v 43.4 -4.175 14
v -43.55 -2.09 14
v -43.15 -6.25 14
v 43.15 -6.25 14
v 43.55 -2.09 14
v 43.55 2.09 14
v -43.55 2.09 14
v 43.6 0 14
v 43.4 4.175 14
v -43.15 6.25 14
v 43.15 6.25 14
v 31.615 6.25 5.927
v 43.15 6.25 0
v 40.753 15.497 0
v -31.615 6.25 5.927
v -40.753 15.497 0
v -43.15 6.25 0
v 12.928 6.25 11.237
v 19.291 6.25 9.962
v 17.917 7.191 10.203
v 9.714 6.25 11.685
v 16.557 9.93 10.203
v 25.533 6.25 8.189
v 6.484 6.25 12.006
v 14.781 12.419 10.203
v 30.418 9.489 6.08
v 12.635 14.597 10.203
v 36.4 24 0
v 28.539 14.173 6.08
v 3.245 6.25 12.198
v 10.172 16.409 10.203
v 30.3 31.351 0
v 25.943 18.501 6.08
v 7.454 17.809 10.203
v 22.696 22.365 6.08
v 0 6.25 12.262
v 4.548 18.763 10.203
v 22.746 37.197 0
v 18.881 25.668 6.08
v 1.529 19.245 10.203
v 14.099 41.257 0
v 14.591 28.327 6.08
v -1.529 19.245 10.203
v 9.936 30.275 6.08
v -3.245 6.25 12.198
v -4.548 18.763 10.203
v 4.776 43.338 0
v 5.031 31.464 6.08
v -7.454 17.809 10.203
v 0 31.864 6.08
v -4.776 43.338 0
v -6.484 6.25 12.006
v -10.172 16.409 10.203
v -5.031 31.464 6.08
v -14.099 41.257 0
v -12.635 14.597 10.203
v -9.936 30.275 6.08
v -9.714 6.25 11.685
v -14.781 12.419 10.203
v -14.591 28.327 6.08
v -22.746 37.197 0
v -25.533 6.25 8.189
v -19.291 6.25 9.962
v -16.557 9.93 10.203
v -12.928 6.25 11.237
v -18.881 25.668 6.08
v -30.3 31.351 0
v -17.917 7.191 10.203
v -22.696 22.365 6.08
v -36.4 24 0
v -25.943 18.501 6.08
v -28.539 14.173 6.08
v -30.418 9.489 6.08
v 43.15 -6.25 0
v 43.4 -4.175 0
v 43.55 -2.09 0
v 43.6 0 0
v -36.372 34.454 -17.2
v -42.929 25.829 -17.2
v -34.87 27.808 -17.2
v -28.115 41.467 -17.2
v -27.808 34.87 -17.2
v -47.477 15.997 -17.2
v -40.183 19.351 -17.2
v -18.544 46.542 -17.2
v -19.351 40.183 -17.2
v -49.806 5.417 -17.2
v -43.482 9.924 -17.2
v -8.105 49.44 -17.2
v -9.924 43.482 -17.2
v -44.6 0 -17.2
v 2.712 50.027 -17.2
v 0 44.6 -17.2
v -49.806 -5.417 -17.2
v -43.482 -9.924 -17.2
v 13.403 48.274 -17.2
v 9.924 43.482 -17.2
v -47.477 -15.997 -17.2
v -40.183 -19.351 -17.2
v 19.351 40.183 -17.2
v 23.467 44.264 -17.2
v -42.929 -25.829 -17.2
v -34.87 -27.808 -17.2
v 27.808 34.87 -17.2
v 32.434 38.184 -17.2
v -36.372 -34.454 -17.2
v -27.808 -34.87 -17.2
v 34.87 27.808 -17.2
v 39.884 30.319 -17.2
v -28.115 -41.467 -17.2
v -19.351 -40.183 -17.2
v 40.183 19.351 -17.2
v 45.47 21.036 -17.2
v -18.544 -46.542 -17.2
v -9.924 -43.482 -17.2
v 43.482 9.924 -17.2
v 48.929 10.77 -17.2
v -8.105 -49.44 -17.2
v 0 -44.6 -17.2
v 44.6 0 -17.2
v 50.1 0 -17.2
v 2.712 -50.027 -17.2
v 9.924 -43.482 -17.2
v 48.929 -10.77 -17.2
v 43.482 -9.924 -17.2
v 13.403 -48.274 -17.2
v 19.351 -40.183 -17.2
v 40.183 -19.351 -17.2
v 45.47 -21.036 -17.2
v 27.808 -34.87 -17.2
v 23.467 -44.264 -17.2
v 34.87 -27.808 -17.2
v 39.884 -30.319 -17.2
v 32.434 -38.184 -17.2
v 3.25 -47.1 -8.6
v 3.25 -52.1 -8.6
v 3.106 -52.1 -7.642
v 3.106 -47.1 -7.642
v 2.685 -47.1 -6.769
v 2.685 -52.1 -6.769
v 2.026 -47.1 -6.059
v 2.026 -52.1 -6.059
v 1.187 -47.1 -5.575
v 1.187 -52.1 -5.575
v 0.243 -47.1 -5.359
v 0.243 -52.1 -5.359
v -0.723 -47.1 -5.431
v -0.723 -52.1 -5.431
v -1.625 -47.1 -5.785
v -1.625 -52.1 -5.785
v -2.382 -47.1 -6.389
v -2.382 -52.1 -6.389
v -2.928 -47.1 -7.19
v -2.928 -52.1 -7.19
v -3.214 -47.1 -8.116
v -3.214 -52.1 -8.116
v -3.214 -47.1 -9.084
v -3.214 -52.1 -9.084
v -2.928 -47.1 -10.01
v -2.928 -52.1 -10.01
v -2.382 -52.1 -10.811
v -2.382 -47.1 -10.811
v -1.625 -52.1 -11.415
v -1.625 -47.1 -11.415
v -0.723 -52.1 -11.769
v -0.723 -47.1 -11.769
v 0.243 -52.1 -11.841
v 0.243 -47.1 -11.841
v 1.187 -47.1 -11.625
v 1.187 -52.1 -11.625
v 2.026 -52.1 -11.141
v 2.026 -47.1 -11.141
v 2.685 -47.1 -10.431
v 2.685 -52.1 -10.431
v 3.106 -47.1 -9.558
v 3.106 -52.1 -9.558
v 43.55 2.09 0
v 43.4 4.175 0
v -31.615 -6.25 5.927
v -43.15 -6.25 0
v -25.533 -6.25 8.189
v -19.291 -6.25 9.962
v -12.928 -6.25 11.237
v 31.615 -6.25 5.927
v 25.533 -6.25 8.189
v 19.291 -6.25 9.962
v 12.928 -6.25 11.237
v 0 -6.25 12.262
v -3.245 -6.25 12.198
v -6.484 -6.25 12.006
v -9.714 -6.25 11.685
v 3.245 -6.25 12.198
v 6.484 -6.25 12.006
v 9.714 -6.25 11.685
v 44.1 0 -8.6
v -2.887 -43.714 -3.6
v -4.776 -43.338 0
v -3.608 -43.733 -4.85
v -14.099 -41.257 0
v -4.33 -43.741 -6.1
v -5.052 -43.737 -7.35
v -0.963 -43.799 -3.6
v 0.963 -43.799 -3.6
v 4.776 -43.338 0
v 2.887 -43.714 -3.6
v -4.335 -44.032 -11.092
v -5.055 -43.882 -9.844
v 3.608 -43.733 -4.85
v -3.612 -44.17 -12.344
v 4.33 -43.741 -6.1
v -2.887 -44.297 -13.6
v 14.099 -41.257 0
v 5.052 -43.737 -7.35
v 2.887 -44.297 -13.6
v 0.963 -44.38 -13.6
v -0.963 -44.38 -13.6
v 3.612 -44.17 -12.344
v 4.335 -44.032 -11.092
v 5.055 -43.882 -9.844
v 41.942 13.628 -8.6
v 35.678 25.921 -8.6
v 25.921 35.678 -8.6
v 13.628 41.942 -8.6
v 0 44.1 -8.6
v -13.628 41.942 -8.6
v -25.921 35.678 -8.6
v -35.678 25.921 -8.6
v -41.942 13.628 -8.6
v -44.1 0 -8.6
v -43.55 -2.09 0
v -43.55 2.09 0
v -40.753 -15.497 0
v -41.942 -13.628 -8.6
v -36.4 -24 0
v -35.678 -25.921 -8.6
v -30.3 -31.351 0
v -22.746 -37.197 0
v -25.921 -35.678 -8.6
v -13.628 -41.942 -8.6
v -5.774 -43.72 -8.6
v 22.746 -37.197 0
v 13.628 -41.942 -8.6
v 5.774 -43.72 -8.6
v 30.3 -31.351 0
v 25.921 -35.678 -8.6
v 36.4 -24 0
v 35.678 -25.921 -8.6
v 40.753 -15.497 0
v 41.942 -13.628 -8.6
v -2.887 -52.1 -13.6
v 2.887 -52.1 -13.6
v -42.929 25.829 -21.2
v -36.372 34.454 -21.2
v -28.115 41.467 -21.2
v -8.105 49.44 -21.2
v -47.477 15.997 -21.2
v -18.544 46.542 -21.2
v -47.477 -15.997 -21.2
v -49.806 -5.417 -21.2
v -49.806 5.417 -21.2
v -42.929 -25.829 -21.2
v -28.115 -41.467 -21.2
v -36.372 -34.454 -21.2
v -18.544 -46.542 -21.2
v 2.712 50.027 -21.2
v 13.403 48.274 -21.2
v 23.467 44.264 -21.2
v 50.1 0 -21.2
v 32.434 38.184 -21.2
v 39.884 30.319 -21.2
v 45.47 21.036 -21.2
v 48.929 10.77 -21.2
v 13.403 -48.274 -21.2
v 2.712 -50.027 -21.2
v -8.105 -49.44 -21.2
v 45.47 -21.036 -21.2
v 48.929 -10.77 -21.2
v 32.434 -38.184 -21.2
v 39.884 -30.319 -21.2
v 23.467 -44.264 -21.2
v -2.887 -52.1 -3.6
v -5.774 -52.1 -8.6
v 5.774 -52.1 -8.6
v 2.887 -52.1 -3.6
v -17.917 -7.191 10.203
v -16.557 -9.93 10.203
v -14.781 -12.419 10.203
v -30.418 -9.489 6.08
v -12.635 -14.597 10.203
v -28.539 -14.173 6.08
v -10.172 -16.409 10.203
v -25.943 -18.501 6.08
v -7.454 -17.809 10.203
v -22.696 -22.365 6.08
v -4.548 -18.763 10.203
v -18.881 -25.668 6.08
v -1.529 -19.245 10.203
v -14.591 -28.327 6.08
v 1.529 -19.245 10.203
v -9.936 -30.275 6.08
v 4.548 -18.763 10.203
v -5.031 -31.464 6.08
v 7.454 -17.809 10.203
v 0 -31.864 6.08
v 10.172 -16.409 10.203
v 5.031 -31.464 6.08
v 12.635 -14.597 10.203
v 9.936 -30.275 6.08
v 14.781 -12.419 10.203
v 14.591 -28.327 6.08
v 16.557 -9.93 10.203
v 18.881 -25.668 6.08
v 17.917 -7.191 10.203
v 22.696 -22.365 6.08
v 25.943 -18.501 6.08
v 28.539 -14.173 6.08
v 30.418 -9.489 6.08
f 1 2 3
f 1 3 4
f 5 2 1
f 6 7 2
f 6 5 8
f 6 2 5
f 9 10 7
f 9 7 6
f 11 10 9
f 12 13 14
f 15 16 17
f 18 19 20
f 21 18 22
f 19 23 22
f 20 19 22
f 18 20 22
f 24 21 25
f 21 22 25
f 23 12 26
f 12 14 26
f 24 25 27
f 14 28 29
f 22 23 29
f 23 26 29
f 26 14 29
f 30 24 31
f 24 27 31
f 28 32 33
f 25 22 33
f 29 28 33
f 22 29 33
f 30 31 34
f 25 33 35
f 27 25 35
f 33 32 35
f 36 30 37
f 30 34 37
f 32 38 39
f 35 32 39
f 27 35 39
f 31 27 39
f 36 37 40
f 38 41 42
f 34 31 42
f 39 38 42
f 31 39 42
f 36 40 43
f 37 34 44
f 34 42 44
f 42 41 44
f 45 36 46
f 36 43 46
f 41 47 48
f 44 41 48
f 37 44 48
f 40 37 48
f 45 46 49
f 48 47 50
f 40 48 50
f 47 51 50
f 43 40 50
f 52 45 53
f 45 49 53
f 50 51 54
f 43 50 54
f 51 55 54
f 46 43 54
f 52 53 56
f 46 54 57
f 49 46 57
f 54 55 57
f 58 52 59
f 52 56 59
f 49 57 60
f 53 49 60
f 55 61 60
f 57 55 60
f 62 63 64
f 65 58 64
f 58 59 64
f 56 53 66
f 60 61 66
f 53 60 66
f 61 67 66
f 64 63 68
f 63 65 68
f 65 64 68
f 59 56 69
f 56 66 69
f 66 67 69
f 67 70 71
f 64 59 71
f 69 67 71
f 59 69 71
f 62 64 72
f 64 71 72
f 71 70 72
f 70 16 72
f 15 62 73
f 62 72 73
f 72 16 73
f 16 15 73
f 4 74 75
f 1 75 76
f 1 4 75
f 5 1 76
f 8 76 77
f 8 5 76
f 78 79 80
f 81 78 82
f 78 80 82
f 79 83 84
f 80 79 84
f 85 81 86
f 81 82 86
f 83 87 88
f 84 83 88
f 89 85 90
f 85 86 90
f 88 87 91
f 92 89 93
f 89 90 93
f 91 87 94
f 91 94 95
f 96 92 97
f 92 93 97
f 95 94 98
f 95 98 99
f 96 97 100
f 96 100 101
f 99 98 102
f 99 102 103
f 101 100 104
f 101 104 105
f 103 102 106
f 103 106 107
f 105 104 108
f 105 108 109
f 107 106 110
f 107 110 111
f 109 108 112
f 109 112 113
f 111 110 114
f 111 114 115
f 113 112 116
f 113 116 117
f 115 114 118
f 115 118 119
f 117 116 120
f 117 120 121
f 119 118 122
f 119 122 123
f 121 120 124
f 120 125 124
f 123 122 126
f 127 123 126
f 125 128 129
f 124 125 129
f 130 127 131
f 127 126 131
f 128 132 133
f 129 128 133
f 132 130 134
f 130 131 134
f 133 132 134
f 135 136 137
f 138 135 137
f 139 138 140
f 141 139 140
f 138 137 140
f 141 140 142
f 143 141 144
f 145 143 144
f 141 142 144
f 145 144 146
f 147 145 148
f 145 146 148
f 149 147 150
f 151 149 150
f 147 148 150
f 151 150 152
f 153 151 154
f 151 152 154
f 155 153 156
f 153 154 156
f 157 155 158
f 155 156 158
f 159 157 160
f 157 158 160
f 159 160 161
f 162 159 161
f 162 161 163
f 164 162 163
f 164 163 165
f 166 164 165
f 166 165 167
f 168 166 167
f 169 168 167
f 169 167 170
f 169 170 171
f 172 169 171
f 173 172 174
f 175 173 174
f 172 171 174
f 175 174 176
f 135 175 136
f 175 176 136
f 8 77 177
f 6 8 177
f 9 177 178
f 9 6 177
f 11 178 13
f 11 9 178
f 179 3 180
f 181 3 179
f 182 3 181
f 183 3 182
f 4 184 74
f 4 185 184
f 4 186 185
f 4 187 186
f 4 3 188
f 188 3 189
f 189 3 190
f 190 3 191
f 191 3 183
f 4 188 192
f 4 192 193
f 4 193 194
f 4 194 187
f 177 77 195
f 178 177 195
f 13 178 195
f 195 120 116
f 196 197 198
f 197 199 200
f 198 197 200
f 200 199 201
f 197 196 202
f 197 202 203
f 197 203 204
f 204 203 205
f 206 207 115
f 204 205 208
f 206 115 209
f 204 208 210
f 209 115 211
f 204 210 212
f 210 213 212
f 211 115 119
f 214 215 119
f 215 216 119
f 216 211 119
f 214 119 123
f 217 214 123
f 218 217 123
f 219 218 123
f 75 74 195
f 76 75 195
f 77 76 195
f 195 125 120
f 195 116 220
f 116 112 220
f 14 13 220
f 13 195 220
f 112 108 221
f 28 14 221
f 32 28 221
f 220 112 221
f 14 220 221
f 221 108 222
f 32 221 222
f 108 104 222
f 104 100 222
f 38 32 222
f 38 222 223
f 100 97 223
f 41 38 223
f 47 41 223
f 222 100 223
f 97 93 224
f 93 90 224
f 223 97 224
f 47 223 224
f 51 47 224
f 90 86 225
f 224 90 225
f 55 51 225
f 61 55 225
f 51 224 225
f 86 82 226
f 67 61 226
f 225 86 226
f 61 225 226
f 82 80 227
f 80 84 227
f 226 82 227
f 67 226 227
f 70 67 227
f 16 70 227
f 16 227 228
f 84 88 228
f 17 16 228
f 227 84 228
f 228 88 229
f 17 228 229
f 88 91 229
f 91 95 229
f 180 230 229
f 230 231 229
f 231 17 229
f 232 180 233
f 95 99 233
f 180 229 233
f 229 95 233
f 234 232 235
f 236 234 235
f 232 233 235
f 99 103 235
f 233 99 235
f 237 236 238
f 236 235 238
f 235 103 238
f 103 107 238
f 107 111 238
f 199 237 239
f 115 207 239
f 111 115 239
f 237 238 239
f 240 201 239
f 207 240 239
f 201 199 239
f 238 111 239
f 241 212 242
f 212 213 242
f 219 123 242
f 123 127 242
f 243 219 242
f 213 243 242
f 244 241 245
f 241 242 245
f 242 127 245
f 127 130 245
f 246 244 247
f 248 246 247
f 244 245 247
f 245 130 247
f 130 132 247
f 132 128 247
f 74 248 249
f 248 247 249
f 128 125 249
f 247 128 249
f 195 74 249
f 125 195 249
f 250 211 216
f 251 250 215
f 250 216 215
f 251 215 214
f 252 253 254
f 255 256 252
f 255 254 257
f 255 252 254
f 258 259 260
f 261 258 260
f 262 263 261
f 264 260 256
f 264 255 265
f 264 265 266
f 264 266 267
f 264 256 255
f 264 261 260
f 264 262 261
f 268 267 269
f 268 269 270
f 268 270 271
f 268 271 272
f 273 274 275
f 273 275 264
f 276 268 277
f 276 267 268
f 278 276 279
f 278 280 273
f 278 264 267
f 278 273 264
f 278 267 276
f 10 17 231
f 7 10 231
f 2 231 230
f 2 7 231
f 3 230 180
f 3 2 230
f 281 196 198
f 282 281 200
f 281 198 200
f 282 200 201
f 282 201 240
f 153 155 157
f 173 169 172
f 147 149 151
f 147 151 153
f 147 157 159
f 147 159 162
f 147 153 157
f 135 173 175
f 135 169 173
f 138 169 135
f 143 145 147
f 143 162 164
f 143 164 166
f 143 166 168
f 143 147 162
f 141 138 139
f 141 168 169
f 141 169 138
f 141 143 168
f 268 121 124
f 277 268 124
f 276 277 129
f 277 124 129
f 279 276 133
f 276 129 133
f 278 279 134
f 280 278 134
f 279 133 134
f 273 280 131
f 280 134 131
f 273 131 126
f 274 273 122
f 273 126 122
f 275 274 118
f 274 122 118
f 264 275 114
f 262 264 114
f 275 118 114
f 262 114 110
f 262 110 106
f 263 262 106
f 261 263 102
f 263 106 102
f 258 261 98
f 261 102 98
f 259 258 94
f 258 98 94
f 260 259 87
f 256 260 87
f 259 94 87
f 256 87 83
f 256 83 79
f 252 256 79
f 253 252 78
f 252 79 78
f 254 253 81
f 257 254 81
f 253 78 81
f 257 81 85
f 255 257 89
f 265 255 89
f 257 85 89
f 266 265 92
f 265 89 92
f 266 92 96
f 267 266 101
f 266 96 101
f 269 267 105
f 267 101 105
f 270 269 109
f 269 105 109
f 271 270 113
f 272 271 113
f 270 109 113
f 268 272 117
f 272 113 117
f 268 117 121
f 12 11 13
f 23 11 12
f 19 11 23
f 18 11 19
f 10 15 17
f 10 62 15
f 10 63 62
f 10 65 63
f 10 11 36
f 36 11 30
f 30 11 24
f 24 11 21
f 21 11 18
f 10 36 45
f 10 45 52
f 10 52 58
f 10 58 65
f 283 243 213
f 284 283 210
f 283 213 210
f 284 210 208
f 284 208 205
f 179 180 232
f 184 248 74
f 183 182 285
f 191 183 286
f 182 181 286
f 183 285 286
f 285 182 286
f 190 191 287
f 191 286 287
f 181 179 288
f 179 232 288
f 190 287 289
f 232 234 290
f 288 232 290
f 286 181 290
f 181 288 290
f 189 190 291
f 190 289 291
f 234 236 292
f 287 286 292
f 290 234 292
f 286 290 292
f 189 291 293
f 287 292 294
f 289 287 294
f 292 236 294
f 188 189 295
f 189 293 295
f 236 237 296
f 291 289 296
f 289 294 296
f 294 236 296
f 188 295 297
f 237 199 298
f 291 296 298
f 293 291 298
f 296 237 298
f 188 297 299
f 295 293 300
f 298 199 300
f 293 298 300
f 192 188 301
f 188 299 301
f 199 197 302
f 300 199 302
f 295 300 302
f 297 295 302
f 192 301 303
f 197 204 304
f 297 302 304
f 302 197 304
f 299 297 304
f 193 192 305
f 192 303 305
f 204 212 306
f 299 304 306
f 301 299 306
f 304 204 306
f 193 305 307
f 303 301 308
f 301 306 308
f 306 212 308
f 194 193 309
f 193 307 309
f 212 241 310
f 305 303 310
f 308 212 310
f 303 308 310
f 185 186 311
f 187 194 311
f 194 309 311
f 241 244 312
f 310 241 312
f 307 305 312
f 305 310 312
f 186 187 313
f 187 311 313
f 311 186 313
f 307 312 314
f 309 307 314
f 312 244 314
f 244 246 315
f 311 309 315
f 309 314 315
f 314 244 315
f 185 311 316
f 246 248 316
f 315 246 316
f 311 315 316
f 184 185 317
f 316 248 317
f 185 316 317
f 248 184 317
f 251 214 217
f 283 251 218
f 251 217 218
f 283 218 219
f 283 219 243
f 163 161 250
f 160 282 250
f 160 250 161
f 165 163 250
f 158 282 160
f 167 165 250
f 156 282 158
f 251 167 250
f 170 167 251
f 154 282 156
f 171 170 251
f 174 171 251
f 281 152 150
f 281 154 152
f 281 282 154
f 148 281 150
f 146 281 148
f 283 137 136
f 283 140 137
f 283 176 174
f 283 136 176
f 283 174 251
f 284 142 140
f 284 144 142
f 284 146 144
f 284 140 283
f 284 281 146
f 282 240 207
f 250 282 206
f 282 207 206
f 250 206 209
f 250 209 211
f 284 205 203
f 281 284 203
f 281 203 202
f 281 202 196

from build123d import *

# Parameters (mm, degrees)
F0_R      = 43.6
F2_R      = 44.6
F4_R      = 50.1
F4_R_2    = 44.6
F5_DEPTH  = 4
F13_DEPTH = 8.5
F14_R     = 3.25
F15_DEPTH = 5


with BuildPart() as f3:
    # F0 (on Top) → F3 section 0
    with BuildSketch(Plane.XY):
        Circle(F0_R)
    # F2 (on offset) → F3 section 1
    with BuildSketch(Plane.XY.offset(-17.2)):
        Circle(F2_R)
    loft()

    # F4 (on face) → F5 (join)
    with BuildSketch(Plane(origin=(0, 0, -17.2), x_dir=(1, 0, 0), z_dir=(0, 0, -1))):
        Circle(F4_R)
        Circle(F4_R_2, mode=Mode.SUBTRACT)
        Circle(F4_R_2)
    extrude(amount=F5_DEPTH)

    # F6 (on Front) → F7 (revolve)
    with BuildSketch(Plane.XZ):
        with BuildLine():
            Line((-43.6, 0), (0, 0))
            Line((0, 0), (0, 12.5))
            ThreePointArc((0, 12.5), (-22.6782384677, 9.3132957755), (-43.6, 0))
        make_face()
    revolve(axis=Axis((0, 0, 11.7095857859), (0, 0, 1)))

    # F9 (on offset) → F10 (join, up to the next surface of F3)
    with BuildSketch(Plane.XY.offset(14)):
        with BuildLine():
            ThreePointArc((43.6, 0), (43.4872818741, 3.1330999347), (43.1497103119, 6.25))
            Line((43.1497103119, 6.25), (-43.1497103119, 6.25))
            ThreePointArc((-43.1497103119, 6.25), (-43.6, 0), (-43.1497103119, -6.25))
            Line((-43.1497103119, -6.25), (43.1497103119, -6.25))
            ThreePointArc((43.1497103119, -6.25), (43.4872818741, -3.1330999347), (43.6, 0))
        make_face()
    extrude(until=Until.NEXT, dir=(0, 0, -1))

    # F12 (on offset) → F13 (join)
    with BuildSketch(Plane.XZ.offset(43.6)):
        Polygon((2.8867513459, -13.6), (5.7735026919, -8.6), (2.8867513459, -3.6), (-2.8867513459, -3.6), (-5.7735026919, -8.6), (-2.8867513459, -13.6), align=None)
    extrude(amount=F13_DEPTH)

    # F14 (on face) → F15 (cut)
    with BuildSketch(Plane.XZ.offset(52.1)):
        with Locations((0, -8.6)):
            Circle(F14_R)
    extrude(amount=-F15_DEPTH, mode=Mode.SUBTRACT)


solid = f3.part
